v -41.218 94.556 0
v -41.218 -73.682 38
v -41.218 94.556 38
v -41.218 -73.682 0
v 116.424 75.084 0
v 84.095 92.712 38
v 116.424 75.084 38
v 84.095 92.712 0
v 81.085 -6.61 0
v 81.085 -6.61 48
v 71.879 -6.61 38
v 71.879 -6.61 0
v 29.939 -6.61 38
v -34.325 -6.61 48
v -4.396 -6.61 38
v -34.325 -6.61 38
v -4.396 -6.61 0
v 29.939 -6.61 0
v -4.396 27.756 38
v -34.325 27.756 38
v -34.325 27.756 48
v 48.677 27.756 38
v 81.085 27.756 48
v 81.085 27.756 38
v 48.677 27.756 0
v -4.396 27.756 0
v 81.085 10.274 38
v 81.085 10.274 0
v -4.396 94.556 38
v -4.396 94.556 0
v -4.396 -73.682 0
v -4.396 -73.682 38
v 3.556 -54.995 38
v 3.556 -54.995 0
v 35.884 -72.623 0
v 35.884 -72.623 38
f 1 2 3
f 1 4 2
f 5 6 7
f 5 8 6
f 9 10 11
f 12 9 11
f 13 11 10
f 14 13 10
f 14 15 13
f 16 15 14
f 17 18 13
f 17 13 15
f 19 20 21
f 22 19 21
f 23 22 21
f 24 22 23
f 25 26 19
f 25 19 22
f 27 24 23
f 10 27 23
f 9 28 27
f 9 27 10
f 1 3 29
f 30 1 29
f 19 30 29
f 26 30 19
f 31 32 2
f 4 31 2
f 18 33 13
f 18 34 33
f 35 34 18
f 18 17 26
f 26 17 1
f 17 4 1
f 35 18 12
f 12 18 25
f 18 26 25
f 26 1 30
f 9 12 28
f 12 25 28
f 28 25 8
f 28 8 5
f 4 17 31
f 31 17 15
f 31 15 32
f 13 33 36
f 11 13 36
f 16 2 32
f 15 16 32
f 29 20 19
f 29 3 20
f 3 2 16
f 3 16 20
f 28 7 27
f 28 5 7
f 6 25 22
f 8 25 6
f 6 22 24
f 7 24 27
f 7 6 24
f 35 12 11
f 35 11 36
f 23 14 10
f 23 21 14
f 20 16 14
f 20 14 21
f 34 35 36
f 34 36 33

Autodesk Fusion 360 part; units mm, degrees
sketch "Sketch1" plane through (0, 0, 0) normal (0, 0, 1) x (1, 0, 0)
  line L0 (-41.2185, 94.5561) -> (-4.3961, 94.5561)
  line L1 (-4.3961, 94.5561) -> (-4.3961, -73.6817)
  line L2 (-4.3961, -73.6817) -> (-41.2185, -73.6817)
  line L3 (-41.2185, -73.6817) -> (-41.2185, 94.5561)
  line L4 (84.0952, 92.7118) -> (116.424, 75.0841)
  line L5 (116.424, 75.0841) -> (35.8844, -72.6229)
  line L6 (35.8844, -72.6229) -> (3.5557, -54.9951)
  line L7 (3.5557, -54.9951) -> (84.0952, 92.7118)
  line L8 (81.0854, 27.7563) -> (81.0854, -6.6095)
  line L9 (81.0854, -6.6095) -> (-34.3246, -6.6095)
  line L10 (-34.3246, -6.6095) -> (-34.3246, 27.7563)
  line L11 (-34.3246, 27.7563) -> (81.0854, 27.7563)
extrude "Extrude2" add sketch "Sketch1" along normal blind 48 contours L1 L7 L9 L11 | L1 L9 L10 L11 | L5 L7 L8 L9 L11 | L5 L8 L9 makes body 1
extrude "Extrude1" add sketch "Sketch1" along normal blind 38 separate body contours L0 L1 L2 L3 L9 L10 L11 makes body 2
extrude "Extrude3" add sketch "Sketch1" along normal blind 38 separate body contours L5 L6 L7 L9 makes body 3
extrude "Extrude4" add sketch "Sketch1" along normal blind 38 separate body contours L4 L5 L7 L8 L11 makes body 4
combine "Combine1" operation add target body 4 tool bodies 3 2 1
